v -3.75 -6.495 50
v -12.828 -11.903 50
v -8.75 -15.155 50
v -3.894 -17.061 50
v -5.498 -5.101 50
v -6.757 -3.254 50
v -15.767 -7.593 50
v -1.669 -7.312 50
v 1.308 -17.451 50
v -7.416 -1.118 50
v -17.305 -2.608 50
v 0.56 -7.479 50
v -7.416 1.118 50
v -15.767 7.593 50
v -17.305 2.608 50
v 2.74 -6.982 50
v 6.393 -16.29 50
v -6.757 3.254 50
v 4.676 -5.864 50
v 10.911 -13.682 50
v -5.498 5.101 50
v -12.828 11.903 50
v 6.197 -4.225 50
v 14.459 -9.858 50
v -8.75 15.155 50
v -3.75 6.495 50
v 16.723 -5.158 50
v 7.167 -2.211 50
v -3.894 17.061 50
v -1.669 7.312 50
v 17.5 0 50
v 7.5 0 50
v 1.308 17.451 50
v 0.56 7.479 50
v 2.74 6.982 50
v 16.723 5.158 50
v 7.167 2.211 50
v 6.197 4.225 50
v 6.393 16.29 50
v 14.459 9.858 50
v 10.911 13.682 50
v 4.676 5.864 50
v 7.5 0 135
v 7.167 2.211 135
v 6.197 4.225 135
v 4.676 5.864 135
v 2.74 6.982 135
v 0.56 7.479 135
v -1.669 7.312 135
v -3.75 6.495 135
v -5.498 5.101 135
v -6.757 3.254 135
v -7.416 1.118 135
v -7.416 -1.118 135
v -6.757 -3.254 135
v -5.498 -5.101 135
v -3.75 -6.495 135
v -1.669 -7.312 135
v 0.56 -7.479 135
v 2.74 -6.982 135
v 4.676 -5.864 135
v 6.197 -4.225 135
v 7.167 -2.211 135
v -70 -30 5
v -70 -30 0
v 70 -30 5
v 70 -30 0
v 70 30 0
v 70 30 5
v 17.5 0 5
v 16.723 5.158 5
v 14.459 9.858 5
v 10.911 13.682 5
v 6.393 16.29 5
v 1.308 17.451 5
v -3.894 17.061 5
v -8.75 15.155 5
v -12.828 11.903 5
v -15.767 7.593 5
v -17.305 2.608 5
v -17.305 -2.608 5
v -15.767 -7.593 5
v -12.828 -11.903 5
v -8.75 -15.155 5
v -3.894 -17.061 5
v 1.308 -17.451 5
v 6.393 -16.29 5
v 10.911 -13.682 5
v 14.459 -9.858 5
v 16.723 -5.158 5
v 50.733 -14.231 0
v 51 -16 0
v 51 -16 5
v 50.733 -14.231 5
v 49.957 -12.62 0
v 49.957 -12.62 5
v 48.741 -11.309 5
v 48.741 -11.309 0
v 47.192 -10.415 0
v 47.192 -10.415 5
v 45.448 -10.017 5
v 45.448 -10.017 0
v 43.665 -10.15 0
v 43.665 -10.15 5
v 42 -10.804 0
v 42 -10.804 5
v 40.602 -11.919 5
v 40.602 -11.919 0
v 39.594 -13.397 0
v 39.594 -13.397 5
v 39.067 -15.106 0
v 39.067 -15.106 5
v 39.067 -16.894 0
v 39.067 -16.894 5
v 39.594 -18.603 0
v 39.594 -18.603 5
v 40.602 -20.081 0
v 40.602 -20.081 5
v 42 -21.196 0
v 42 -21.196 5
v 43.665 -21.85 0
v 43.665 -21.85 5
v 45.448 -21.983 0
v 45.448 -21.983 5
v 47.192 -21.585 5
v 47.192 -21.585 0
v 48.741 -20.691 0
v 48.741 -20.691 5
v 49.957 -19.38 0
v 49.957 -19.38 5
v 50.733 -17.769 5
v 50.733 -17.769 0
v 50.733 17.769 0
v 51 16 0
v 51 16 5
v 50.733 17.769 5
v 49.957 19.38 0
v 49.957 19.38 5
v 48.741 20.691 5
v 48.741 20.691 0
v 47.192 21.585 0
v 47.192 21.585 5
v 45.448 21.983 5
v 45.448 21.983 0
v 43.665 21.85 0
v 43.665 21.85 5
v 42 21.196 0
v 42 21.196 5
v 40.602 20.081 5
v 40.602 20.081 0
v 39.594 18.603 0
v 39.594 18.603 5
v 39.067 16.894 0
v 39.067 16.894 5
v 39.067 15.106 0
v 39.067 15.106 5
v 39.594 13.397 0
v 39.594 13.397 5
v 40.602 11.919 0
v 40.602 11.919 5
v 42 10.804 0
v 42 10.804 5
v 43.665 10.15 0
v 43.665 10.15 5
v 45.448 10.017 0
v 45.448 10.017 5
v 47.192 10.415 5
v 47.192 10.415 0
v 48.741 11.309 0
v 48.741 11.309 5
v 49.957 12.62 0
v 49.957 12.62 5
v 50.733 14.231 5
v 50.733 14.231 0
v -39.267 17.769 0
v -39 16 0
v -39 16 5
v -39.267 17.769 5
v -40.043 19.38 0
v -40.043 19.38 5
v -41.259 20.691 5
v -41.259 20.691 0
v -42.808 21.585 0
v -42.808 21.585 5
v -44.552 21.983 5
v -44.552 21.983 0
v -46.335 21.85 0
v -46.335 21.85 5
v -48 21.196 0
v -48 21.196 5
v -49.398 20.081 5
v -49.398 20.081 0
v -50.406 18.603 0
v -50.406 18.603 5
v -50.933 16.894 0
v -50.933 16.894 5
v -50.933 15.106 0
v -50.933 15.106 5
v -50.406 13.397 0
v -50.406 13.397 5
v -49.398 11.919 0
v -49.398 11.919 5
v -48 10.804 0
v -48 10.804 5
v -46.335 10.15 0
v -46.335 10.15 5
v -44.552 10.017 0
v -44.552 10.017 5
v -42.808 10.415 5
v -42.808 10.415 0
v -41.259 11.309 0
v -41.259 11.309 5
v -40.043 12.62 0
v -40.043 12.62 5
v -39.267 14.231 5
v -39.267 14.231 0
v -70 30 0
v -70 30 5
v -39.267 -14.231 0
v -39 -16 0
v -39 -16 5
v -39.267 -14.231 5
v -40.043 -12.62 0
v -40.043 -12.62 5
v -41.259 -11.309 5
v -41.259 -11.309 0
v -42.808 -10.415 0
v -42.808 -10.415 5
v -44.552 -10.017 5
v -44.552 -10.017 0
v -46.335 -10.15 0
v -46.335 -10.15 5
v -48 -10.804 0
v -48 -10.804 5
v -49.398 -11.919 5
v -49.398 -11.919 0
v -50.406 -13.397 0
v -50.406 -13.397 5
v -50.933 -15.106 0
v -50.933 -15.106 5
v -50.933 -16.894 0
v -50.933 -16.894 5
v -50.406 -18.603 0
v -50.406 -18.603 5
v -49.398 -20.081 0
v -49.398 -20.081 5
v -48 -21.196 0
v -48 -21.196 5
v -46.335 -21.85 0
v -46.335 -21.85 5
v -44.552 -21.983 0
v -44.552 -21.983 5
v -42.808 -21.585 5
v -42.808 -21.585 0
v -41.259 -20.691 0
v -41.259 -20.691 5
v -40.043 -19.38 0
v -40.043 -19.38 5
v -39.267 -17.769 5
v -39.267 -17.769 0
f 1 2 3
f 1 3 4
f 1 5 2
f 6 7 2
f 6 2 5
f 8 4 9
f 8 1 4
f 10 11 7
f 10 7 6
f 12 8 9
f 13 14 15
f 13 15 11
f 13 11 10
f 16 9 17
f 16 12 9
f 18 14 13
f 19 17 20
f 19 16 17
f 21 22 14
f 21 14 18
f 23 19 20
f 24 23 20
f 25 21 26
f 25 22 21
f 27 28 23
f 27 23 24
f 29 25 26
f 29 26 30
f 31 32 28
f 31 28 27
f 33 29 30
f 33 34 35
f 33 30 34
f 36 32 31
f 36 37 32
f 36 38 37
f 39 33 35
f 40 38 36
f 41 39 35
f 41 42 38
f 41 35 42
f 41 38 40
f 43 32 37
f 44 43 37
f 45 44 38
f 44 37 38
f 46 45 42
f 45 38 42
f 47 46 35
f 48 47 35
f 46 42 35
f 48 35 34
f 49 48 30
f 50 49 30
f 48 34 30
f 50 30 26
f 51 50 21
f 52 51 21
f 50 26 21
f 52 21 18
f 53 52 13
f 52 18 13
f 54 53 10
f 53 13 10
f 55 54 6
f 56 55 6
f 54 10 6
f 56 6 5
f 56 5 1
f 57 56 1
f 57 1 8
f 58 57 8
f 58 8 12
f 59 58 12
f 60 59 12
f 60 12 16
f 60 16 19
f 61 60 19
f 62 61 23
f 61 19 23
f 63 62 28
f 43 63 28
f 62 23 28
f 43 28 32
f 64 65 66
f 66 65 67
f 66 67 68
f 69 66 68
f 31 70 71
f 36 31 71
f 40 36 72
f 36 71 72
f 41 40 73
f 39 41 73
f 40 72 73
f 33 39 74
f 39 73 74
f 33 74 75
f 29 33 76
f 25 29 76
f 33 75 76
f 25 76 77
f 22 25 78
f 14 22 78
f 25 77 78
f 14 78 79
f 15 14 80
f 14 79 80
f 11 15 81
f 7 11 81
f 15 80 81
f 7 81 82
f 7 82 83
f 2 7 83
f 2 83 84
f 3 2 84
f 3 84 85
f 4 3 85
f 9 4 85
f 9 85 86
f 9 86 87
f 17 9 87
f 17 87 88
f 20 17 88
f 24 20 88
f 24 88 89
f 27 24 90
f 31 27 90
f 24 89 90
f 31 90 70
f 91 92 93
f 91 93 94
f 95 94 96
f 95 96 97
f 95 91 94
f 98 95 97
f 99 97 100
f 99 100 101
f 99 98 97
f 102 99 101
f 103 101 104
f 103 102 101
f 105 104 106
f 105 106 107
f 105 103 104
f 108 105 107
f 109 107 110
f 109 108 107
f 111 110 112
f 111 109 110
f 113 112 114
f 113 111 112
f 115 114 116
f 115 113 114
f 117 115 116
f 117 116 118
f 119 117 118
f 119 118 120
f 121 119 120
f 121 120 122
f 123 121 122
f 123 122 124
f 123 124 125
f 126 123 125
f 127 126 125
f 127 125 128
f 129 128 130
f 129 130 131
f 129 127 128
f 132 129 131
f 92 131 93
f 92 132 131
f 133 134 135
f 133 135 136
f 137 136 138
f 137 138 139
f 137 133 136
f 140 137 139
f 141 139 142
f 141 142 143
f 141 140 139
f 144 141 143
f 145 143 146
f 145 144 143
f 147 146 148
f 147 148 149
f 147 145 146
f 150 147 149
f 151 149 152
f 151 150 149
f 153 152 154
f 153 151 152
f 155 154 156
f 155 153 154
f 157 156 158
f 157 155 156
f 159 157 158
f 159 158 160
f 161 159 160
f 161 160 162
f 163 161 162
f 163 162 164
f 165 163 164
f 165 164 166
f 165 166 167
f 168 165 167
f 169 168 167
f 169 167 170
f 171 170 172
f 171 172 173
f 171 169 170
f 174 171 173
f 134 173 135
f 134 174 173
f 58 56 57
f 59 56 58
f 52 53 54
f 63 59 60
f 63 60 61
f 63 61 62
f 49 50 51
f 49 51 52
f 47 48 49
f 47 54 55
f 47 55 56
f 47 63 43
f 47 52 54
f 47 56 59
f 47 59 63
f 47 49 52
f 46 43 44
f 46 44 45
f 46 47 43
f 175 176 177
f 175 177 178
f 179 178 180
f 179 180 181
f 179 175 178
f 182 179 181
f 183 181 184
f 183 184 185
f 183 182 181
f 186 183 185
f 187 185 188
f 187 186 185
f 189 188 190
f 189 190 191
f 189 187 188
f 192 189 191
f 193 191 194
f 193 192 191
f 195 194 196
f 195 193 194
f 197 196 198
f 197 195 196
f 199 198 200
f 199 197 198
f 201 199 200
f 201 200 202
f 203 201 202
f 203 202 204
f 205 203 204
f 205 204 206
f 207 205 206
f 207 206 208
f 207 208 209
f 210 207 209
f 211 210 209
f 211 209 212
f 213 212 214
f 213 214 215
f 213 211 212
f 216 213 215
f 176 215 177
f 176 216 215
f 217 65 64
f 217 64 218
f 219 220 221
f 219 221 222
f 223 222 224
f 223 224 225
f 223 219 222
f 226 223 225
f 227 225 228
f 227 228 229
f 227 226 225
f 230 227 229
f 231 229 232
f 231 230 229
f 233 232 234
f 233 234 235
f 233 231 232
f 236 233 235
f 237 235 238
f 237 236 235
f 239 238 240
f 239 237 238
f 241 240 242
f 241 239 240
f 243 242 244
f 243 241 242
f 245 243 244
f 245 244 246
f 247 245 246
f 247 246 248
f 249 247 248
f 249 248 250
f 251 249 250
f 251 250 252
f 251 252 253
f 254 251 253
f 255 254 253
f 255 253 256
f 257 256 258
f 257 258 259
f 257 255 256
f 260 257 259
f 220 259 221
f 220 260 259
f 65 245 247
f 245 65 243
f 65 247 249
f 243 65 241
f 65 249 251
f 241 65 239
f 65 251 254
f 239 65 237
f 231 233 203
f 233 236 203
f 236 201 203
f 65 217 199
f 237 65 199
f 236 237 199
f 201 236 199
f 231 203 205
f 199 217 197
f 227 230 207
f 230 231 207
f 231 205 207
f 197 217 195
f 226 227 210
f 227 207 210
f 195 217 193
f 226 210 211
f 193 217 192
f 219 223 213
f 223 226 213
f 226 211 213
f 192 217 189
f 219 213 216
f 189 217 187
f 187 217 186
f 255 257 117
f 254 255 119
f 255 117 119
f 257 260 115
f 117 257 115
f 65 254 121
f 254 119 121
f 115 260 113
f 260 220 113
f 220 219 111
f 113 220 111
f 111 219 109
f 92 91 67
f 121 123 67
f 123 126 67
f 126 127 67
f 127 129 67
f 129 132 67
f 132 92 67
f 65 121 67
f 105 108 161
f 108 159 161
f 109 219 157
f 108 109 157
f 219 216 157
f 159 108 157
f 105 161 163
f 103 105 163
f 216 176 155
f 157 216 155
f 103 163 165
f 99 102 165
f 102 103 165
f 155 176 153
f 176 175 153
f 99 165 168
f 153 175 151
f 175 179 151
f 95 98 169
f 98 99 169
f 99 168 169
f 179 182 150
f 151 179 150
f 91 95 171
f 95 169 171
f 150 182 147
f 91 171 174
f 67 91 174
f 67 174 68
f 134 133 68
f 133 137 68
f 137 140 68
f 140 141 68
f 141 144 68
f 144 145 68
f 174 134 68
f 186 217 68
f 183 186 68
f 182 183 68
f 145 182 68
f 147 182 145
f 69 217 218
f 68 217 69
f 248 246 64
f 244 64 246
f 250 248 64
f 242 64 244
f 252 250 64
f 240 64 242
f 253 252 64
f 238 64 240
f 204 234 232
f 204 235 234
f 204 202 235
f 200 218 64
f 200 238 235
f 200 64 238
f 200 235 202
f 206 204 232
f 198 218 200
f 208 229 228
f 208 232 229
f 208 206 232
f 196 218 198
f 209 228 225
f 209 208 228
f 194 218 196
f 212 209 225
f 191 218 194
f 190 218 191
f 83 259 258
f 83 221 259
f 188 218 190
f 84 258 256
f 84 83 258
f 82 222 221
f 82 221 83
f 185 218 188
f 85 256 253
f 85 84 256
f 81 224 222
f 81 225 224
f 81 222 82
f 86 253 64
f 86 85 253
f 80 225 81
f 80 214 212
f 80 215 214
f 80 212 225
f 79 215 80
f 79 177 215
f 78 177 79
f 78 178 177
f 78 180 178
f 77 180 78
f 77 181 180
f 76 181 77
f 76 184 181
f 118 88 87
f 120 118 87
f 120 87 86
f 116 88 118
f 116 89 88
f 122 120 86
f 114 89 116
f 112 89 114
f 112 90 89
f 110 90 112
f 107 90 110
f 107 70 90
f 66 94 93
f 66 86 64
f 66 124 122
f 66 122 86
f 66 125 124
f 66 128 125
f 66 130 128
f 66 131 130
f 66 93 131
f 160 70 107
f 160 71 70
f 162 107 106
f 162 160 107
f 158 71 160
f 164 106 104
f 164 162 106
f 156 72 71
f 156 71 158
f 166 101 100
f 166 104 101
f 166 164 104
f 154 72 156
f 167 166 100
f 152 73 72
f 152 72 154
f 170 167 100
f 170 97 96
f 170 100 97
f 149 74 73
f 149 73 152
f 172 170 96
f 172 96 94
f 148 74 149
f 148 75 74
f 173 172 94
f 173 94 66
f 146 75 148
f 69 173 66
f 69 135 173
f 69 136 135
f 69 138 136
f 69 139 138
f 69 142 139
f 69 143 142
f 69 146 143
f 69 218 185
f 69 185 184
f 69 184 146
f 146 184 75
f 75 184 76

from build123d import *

# Parameters (mm, degrees)
SKETCH1_W           = 140
SKETCH1_H           = 60
SKETCH1_R           = 6
BOSS_EXTRUDE1_DEPTH = 5
SKETCH2_R           = 17.5
BOSS_EXTRUDE2_DEPTH = 45
SKETCH3_R           = 7.5
BOSS_EXTRUDE3_DEPTH = 85


with BuildPart() as part:
    # Sketch1 → Boss-Extrude1 (new body)
    with BuildSketch(Plane.XY):
        Rectangle(SKETCH1_W, SKETCH1_H)
        with Locations((-45, 16)):
            Circle(SKETCH1_R, mode=Mode.SUBTRACT)
        with Locations((-45, -16)):
            Circle(SKETCH1_R, mode=Mode.SUBTRACT)
        with Locations((45, -16)):
            Circle(SKETCH1_R, mode=Mode.SUBTRACT)
        with Locations((45, 16)):
            Circle(SKETCH1_R, mode=Mode.SUBTRACT)
    extrude(amount=BOSS_EXTRUDE1_DEPTH)

    # Sketch2 → Boss-Extrude2 (add)
    with BuildSketch(Plane.XY.offset(5)):
        Circle(SKETCH2_R)
    extrude(amount=BOSS_EXTRUDE2_DEPTH)

    # Sketch3 → Boss-Extrude3 (add)
    with BuildSketch(Plane.XY.offset(50)):
        Circle(SKETCH3_R)
    extrude(amount=BOSS_EXTRUDE3_DEPTH)


solid = part.part
